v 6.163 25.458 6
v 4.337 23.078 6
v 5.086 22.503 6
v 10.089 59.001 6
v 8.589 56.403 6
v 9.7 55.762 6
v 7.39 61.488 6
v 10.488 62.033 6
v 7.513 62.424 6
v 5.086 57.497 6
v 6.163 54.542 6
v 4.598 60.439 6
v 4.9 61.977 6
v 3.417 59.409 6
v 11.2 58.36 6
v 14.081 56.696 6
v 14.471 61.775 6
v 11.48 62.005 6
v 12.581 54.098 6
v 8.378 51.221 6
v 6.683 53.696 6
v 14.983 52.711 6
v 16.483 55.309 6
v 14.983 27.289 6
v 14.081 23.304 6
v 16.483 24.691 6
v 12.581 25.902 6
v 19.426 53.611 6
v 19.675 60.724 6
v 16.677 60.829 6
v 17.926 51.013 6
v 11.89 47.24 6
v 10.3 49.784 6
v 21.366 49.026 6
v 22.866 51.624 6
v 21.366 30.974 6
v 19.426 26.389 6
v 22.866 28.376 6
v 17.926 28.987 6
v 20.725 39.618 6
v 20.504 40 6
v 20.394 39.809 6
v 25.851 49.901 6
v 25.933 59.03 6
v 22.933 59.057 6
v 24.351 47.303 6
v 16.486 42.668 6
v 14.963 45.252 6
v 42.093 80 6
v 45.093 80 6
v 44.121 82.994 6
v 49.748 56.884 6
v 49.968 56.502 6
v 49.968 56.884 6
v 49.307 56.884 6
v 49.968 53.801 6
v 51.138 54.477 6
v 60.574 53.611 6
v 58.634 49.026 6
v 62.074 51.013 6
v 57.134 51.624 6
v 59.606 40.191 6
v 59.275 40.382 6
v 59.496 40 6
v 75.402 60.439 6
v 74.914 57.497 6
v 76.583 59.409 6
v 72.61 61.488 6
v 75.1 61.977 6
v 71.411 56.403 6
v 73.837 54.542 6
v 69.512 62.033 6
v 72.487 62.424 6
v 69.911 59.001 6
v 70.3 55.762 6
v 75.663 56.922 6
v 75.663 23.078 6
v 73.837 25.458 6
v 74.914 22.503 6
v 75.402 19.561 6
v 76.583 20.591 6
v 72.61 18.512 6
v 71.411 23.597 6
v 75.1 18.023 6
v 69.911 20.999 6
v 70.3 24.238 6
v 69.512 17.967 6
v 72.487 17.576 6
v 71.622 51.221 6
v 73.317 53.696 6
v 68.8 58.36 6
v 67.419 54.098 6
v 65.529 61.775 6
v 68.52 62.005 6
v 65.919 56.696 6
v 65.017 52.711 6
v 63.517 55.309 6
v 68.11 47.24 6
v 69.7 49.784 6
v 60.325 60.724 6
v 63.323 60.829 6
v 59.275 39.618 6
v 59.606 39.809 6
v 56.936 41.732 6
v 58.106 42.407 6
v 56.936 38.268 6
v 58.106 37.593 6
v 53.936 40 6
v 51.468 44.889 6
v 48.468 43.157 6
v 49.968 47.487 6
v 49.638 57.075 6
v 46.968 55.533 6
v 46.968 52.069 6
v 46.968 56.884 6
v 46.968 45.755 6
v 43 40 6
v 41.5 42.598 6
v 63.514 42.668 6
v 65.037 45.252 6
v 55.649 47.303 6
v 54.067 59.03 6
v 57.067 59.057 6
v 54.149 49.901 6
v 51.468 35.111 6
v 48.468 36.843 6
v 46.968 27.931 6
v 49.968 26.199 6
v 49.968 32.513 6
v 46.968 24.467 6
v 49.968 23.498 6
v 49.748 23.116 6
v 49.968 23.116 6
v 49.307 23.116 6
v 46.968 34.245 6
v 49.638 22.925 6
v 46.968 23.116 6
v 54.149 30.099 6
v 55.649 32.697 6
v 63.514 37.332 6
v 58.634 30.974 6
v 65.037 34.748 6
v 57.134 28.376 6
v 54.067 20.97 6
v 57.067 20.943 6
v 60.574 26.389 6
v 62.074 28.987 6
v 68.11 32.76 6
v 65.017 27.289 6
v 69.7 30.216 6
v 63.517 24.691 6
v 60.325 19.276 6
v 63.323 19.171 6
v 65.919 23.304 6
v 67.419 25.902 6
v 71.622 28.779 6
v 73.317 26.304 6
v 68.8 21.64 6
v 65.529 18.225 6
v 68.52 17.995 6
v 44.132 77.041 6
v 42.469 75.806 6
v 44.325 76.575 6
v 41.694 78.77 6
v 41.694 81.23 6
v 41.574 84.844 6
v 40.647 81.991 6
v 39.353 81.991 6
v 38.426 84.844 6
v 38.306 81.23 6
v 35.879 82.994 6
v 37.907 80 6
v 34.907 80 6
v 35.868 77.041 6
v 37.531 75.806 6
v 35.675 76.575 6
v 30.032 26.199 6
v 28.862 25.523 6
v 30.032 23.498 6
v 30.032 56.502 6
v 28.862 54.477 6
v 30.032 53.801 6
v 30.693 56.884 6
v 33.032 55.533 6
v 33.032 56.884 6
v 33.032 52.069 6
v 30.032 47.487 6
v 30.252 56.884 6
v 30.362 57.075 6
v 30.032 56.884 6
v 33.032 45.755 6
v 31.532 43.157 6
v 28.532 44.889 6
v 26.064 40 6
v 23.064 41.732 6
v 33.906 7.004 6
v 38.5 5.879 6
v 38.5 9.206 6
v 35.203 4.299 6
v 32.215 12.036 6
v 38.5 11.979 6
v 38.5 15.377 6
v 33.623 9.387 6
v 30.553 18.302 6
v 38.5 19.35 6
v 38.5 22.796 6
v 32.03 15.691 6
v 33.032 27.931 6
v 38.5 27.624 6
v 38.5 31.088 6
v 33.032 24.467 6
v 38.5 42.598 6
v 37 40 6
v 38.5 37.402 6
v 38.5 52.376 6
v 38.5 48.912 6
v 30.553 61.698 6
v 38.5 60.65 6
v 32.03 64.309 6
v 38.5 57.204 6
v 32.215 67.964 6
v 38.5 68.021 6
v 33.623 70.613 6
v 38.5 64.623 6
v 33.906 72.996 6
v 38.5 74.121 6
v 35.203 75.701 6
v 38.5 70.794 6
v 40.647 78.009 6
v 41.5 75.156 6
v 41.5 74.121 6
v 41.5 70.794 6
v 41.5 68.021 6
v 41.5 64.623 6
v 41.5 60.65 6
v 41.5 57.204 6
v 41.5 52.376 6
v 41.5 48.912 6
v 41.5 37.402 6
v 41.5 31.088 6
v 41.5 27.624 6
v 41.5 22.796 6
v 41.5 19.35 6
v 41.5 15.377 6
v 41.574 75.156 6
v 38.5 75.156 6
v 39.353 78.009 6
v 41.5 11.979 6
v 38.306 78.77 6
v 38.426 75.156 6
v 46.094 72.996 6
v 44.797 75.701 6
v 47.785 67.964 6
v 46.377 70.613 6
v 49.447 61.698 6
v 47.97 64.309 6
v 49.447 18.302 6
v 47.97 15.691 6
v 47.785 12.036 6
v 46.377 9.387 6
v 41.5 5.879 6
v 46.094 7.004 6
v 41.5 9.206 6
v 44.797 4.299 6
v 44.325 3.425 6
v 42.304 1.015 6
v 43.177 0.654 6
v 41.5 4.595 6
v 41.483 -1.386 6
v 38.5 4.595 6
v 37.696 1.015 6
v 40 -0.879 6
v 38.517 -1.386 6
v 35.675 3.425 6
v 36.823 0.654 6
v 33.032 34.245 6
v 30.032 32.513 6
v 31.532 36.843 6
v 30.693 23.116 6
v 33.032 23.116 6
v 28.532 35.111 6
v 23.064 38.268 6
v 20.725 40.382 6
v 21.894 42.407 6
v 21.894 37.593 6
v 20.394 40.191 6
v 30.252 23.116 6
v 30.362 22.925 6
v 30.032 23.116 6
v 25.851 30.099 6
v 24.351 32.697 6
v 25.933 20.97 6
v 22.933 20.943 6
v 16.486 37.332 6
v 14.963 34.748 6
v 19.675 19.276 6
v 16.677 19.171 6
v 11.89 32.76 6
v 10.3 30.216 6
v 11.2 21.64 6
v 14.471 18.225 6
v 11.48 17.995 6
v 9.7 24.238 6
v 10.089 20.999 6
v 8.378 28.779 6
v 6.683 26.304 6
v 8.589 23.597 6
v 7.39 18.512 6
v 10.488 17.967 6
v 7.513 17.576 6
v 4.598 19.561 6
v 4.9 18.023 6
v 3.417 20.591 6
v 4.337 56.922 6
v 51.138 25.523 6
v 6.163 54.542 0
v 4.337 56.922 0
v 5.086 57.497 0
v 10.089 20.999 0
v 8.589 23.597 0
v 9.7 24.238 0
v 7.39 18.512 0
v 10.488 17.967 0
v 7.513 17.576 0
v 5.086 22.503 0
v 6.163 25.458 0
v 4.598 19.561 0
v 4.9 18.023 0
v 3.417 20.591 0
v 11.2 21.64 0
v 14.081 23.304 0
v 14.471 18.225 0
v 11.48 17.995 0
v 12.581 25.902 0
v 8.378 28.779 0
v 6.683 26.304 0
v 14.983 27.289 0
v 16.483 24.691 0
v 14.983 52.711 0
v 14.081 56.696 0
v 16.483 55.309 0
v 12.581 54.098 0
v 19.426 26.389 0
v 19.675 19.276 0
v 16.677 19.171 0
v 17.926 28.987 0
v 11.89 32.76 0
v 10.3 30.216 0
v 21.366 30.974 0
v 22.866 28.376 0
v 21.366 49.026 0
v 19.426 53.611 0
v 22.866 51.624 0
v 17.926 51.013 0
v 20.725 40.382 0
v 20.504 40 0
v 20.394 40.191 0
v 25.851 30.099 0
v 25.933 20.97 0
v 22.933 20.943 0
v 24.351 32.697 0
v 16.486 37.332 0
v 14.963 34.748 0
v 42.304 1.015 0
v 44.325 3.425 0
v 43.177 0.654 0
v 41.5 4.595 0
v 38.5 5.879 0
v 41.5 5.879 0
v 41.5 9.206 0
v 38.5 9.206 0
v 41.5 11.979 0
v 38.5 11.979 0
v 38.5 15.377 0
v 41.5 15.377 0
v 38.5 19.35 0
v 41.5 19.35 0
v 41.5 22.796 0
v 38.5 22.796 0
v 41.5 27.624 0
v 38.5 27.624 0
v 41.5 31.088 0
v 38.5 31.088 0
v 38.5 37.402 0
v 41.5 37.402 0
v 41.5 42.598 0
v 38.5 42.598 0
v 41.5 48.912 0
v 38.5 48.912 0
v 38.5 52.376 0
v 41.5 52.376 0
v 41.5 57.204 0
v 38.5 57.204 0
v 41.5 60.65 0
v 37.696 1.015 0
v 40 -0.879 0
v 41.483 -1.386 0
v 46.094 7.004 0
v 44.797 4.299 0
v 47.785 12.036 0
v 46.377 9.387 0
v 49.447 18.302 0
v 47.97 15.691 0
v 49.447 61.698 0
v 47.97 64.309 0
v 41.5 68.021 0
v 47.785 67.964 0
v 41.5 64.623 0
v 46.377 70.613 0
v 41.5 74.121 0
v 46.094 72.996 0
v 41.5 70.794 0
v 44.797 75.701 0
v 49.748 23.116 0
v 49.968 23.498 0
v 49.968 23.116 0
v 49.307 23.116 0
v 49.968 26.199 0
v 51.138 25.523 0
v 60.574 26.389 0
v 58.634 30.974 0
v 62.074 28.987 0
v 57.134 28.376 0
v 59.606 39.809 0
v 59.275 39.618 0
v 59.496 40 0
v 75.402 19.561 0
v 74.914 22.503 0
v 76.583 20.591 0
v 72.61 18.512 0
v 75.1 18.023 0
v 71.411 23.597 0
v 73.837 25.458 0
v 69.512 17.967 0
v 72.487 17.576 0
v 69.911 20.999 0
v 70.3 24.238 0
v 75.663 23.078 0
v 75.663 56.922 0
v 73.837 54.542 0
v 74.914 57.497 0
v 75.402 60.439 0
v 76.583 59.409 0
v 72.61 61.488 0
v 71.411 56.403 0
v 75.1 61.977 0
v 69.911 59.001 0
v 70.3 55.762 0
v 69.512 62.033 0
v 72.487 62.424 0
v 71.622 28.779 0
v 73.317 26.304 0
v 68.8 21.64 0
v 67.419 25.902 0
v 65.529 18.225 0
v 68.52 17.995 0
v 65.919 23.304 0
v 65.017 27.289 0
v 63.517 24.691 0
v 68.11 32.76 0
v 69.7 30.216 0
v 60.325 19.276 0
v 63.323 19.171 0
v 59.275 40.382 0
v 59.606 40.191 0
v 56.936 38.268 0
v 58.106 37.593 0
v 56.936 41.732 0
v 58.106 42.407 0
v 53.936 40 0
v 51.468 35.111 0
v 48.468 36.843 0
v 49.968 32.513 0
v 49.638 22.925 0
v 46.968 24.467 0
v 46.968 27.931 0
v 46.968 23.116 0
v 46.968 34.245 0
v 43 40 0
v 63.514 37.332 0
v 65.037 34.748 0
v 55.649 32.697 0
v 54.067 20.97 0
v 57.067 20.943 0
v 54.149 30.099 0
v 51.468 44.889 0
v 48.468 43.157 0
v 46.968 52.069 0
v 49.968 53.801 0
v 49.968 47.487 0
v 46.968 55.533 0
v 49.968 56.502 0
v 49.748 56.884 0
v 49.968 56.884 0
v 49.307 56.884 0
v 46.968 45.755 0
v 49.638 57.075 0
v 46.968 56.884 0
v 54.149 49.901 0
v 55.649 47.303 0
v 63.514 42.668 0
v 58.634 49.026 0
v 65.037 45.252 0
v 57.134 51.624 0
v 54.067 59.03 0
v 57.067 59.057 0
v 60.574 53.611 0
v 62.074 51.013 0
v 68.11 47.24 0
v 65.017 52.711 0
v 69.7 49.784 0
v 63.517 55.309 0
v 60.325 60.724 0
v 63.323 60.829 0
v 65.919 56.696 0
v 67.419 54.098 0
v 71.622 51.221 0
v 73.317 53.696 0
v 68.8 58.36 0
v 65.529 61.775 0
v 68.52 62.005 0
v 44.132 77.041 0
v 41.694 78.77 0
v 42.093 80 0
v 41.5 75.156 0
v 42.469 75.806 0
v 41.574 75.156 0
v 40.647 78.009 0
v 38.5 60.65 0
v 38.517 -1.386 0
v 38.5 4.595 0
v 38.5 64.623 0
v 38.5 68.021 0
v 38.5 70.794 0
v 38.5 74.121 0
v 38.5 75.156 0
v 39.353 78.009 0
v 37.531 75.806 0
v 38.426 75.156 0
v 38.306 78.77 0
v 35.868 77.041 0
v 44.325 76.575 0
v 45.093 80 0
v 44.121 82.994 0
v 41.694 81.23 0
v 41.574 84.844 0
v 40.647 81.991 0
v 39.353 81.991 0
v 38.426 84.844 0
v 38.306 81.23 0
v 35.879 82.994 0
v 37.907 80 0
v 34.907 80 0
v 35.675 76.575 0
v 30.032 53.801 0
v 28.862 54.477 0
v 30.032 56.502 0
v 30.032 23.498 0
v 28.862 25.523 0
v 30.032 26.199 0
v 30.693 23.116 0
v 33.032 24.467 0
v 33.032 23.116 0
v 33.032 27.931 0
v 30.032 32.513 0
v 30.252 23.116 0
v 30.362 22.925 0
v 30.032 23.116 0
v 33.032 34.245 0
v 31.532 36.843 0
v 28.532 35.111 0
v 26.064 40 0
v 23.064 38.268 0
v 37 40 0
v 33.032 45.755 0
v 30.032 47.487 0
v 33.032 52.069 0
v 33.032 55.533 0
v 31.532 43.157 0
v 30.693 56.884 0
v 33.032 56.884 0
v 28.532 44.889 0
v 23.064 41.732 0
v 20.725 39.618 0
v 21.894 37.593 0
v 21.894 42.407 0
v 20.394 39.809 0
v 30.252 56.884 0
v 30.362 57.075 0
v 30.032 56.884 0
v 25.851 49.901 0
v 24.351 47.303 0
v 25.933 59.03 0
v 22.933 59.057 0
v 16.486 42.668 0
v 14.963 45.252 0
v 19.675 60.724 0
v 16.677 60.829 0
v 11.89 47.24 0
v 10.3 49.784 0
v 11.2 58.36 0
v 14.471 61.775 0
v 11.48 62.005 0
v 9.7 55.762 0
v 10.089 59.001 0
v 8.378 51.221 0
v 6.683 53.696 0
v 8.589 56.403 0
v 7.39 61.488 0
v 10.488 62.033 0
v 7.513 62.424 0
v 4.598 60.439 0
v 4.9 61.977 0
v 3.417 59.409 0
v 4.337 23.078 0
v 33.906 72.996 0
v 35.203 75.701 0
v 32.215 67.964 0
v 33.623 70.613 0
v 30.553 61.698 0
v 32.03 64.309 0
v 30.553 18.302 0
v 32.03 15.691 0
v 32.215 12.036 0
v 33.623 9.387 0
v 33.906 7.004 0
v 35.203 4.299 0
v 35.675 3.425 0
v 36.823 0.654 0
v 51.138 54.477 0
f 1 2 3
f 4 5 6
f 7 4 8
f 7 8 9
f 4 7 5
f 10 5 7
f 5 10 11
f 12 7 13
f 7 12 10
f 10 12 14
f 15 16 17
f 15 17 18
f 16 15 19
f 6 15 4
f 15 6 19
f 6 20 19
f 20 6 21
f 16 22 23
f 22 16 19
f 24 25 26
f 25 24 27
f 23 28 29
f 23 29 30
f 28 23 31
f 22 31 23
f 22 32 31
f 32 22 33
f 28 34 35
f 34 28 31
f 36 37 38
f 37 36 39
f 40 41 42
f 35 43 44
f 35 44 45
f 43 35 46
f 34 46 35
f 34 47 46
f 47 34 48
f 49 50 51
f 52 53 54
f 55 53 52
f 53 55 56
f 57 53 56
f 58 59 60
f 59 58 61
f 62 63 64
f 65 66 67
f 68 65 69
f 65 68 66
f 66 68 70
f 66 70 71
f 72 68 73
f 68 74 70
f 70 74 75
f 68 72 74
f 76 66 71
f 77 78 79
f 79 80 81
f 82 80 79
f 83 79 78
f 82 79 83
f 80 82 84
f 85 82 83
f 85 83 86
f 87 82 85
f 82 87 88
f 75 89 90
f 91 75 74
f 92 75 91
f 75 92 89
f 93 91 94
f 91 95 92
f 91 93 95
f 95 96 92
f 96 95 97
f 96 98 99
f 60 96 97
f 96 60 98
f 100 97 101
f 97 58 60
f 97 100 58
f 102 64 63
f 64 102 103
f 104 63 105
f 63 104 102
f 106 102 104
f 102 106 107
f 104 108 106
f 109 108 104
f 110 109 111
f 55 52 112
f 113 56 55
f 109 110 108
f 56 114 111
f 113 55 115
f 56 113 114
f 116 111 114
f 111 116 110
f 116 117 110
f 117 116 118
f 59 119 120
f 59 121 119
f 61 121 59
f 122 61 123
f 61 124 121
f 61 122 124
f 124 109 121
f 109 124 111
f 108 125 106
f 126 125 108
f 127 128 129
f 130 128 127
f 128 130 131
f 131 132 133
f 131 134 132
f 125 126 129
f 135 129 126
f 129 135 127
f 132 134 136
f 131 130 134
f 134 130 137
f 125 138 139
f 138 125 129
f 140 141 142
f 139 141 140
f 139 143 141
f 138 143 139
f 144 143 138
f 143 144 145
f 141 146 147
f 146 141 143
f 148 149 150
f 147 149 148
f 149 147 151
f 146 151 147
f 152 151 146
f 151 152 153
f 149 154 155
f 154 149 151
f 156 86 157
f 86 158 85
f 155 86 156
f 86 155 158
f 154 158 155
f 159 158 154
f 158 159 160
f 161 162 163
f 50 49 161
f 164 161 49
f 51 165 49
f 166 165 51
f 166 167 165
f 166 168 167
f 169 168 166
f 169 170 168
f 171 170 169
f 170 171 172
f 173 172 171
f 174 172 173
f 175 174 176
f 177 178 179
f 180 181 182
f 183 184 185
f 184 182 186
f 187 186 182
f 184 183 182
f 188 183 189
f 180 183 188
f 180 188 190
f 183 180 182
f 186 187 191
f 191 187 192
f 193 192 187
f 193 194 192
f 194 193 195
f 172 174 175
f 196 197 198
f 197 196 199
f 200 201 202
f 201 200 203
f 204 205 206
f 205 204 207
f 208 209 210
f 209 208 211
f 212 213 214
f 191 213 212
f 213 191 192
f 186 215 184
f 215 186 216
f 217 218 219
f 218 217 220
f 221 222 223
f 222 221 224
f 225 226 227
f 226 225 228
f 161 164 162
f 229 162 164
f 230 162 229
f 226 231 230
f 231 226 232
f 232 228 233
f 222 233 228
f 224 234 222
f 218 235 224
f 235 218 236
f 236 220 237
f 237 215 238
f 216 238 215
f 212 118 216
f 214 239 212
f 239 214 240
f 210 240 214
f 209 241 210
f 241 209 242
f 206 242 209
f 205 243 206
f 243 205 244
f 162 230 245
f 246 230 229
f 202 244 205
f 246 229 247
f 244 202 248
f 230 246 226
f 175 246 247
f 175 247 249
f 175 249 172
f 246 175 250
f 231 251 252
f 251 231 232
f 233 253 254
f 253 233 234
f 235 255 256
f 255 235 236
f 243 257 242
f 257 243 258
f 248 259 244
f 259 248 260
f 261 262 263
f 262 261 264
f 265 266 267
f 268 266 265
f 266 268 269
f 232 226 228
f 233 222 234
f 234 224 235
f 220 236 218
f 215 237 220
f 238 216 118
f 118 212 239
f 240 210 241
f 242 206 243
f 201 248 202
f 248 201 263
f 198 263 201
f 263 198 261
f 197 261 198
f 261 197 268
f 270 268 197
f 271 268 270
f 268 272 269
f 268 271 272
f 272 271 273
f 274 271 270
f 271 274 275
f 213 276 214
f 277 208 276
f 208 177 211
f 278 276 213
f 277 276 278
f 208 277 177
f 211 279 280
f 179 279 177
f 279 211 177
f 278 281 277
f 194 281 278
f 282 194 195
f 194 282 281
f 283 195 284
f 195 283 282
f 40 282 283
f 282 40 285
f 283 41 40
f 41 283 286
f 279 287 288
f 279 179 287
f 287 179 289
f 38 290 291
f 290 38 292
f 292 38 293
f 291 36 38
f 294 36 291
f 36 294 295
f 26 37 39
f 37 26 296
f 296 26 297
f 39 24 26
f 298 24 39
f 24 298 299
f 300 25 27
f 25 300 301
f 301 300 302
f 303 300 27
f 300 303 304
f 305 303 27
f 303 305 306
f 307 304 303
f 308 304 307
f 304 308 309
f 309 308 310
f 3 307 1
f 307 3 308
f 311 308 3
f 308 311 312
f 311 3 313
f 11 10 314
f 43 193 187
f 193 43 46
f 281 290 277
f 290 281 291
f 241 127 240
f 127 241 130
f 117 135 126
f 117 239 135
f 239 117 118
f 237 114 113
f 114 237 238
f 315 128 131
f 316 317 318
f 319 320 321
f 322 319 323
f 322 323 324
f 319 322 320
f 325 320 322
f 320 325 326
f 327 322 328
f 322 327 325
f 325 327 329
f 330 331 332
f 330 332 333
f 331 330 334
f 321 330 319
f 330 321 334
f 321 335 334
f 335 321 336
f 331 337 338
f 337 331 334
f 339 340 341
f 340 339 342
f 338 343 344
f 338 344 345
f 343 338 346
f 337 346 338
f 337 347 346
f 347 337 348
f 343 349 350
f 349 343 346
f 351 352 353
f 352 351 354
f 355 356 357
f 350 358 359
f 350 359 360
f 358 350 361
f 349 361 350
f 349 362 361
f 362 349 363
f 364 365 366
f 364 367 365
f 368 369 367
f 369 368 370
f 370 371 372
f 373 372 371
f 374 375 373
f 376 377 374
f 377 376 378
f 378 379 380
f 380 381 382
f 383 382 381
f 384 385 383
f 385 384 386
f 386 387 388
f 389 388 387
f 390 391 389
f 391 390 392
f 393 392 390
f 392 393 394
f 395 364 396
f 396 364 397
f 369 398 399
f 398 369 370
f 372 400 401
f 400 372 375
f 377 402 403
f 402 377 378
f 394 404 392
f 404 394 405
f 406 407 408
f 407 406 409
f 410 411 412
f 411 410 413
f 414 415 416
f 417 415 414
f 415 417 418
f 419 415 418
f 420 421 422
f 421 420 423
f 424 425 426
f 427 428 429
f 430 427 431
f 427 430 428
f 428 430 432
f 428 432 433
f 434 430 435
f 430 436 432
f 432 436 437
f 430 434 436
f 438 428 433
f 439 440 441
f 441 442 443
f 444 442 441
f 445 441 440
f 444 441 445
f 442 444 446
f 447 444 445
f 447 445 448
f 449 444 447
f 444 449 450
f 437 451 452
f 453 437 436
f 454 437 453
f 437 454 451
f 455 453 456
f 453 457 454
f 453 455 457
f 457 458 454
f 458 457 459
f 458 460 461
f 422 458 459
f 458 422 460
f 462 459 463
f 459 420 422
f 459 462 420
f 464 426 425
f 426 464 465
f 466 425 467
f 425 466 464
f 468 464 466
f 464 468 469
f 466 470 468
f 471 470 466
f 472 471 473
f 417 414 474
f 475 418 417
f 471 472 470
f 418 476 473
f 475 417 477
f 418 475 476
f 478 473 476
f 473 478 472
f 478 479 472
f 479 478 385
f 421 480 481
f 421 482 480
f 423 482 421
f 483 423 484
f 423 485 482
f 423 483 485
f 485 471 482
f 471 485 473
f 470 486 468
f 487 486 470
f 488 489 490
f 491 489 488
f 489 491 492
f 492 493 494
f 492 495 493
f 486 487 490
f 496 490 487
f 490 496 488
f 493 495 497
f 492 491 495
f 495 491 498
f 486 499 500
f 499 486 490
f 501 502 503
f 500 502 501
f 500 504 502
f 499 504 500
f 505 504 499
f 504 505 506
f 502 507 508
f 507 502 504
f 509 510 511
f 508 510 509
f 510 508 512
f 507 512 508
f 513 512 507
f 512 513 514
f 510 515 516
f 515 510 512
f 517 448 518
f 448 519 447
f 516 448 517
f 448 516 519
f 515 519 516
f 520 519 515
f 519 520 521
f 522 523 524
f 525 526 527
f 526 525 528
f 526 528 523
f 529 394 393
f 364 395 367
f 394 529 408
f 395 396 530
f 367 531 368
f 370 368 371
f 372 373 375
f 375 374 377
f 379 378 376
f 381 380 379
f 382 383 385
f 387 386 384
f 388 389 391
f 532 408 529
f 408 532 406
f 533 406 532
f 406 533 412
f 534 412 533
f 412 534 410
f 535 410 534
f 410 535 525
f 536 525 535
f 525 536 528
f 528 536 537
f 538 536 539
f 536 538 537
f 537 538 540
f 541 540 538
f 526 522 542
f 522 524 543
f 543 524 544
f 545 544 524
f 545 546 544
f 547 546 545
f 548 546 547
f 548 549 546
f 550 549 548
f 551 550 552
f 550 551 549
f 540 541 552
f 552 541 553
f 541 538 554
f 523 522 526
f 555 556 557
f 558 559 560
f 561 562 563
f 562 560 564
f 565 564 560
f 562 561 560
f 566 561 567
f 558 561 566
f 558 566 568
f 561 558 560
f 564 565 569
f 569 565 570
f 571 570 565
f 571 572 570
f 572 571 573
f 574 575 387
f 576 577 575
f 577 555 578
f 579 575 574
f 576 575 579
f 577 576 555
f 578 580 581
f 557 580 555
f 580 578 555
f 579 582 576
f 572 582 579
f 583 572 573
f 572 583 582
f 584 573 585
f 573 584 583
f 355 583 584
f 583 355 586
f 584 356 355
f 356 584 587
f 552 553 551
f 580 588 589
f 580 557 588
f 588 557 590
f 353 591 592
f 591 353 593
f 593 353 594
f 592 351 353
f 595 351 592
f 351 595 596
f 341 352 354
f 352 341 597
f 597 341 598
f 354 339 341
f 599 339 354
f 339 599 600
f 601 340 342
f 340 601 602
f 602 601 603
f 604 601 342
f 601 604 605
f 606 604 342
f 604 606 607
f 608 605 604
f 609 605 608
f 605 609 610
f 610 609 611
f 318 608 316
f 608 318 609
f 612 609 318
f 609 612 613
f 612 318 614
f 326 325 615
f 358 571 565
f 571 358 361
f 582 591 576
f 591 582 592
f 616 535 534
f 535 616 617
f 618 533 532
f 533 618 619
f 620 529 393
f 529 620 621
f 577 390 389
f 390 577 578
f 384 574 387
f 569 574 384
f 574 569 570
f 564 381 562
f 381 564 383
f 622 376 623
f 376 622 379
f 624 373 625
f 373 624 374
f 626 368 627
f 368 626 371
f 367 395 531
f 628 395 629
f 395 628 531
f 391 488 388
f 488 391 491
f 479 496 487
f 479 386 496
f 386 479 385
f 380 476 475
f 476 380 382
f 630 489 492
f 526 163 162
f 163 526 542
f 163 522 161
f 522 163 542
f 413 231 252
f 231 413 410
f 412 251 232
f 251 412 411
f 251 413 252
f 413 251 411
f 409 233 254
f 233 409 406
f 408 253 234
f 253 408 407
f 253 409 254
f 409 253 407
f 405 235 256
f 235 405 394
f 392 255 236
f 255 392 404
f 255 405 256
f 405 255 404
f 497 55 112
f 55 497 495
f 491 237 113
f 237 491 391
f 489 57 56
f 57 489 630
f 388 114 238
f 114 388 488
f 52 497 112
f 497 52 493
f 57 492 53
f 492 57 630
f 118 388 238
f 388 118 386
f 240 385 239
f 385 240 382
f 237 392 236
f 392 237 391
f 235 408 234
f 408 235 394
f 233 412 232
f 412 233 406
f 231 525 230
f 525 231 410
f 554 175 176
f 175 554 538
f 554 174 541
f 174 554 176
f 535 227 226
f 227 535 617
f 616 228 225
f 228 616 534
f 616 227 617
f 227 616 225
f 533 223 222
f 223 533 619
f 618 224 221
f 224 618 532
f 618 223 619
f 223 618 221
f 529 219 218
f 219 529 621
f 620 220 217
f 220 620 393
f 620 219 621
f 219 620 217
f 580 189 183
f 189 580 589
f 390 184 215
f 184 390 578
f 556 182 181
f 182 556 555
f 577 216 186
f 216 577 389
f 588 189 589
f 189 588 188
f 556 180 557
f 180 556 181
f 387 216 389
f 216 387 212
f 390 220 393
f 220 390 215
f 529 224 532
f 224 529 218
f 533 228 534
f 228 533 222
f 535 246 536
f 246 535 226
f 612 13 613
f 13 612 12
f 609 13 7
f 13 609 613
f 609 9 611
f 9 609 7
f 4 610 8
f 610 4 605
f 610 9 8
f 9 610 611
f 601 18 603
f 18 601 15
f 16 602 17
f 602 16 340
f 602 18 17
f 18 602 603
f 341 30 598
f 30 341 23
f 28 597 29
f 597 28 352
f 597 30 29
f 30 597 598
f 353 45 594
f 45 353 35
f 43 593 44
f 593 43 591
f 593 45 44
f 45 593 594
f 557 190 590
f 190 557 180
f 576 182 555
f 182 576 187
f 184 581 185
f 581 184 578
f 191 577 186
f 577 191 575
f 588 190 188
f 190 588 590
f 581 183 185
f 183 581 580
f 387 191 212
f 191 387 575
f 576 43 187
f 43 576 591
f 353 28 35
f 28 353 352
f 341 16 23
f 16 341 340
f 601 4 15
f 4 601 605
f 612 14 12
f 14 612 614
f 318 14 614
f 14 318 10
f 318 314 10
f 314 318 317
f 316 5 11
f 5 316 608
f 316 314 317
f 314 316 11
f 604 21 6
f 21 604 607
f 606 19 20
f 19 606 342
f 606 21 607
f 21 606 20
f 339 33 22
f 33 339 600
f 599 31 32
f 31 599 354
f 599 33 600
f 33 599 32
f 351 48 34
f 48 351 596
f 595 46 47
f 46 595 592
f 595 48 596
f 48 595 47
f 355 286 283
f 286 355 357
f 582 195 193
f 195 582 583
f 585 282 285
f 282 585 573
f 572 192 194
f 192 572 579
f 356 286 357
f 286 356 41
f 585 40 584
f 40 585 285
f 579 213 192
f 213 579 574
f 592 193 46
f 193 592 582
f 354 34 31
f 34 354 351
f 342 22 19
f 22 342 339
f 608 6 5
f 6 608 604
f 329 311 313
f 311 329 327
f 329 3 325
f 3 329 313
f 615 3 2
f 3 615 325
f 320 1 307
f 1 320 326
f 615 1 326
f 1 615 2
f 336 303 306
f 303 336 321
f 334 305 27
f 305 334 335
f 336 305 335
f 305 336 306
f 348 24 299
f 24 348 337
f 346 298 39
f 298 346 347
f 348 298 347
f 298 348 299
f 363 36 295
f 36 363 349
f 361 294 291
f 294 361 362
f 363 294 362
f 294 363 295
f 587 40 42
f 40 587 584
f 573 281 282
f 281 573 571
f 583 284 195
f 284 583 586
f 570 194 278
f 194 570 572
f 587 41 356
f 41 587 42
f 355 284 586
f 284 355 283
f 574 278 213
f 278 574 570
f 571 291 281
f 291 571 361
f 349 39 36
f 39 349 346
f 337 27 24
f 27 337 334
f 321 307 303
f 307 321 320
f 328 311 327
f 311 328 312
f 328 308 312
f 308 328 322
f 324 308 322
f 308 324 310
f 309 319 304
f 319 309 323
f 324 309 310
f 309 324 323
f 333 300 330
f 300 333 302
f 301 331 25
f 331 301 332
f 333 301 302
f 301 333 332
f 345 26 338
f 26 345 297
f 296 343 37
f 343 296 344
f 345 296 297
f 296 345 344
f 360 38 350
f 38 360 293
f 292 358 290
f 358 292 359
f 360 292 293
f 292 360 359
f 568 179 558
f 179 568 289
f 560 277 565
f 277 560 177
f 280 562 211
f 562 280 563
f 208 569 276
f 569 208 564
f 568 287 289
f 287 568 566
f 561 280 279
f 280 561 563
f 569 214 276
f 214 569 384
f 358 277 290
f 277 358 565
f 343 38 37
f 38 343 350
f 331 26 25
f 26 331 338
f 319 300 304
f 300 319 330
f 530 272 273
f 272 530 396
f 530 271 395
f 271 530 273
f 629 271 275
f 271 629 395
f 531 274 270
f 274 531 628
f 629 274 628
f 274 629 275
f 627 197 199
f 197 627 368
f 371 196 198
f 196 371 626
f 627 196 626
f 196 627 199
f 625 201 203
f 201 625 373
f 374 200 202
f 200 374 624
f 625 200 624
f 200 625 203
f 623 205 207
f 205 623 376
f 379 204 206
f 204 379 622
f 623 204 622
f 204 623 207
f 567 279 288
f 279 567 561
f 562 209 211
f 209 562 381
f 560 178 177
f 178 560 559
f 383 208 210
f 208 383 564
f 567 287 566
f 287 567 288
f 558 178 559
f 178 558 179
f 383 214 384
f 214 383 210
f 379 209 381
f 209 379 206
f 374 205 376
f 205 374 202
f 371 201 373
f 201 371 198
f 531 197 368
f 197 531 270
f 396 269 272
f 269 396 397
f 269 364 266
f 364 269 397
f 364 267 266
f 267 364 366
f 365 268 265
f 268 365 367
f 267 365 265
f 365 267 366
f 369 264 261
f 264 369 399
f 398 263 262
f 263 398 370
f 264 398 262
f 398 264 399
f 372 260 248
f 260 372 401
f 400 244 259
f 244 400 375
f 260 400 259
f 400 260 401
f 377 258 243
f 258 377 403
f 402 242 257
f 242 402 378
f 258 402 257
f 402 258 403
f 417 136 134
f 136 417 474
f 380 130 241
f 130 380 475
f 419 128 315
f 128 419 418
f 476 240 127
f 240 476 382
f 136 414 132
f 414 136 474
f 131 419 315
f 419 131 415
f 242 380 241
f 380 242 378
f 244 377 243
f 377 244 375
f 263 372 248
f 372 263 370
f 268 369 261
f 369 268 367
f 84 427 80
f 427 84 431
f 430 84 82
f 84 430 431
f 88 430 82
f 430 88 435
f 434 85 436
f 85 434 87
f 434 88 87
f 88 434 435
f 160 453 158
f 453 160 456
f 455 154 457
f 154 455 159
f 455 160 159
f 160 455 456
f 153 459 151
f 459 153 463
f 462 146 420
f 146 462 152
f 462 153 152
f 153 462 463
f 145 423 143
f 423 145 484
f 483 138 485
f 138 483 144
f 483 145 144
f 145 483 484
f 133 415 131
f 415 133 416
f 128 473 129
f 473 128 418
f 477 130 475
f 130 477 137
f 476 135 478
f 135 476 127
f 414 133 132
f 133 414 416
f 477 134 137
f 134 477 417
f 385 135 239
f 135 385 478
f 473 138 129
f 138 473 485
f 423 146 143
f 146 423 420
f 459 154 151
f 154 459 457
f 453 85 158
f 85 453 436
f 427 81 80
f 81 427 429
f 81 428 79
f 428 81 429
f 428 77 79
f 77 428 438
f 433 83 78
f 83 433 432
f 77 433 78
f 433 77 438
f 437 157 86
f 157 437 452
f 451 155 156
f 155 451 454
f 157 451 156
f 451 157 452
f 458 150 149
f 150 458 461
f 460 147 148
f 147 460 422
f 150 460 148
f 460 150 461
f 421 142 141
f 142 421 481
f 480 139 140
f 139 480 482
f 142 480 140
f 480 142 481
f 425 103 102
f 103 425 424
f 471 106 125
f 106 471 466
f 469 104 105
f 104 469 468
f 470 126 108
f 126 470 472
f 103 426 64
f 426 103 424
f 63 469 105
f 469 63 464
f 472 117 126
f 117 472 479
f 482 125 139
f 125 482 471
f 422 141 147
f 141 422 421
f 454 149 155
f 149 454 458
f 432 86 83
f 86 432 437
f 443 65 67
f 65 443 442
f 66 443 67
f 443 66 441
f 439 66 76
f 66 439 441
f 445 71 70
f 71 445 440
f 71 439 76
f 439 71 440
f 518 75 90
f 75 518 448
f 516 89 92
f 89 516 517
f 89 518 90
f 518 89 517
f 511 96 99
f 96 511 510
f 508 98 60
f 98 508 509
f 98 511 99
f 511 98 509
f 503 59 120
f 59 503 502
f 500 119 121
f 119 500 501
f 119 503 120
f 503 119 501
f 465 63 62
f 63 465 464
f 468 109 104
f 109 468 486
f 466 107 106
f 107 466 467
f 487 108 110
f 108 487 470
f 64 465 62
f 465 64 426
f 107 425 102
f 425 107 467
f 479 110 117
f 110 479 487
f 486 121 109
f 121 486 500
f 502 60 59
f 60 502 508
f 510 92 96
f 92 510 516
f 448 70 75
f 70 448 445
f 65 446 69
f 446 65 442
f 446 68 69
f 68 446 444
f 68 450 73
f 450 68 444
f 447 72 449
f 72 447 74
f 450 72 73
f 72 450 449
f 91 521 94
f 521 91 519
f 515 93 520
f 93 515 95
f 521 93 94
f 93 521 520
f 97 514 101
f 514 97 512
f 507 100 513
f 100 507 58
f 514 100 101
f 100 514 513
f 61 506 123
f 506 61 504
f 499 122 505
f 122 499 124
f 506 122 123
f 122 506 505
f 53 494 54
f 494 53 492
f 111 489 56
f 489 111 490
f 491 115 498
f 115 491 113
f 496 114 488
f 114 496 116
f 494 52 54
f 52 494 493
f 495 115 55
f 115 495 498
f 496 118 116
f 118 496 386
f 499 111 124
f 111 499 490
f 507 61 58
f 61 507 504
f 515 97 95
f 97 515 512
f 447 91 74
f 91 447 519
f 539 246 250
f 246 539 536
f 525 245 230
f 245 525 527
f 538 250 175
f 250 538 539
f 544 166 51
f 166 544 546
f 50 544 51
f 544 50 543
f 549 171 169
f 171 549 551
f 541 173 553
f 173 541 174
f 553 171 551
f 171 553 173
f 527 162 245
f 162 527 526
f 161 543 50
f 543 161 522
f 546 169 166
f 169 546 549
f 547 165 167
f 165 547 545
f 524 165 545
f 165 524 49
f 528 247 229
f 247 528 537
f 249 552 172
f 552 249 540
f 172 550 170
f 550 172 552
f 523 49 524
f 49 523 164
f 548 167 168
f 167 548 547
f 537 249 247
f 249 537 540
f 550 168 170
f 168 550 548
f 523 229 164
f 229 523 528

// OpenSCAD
// [FL_INDEX: keywords="openscad, 3d_parametric, Parametric_Snowflake_Ornament, csg_solid" | COT="Parametric OpenSCAD design from 3DCodeverse"]
// Title: Parametric Snowflake Ornament

//Parametric Snowflake... and star
//common snowflake variables
//make seed 100 for a star
arm_num = 6;
branch_length =40;
branch_angle = 15;
branch_thickness = 3;
thickness = 6;
spike_num = 6; //suggest under 40
seed =1; //any number 1 -7

//snowflake starts
module tree(branch_length,branch_angle, branch_thickness, thickness,spike_num,seed){
	module half_tree(){
		cube([branch_thickness/2,branch_length,thickness]);

		for ( i = [1:spike_num]){
			translate([0, (branch_length-1.3)*cos(i*13), 0]) 
			rotate(branch_angle*(seed+sin(i*15))) 
			cube([branch_length*sin(i*(2+seed))+0.5, branch_thickness, thickness]);
		}
	}

	half_tree(branch_length, branch_angle,branch_thickness, thickness,spike_num, seed);
	mirror()half_tree(branch_length, branch_angle, thickness, spike_num, seed);
}

module snowflake(arm_num, branch_length, branch_angle, branch_thickness, thickness, spike_num, seed){
	hole_dist = branch_length;
	translate([0,branch_length,0])cylinder(h=thickness, r=branch_length*sin(1*(2+seed))+branch_thickness, $fn=10);
		for ( i = [0:arm_num-1]){
			rotate( i*360/arm_num, [0,0,1])
			tree(branch_length,branch_angle, branch_thickness, thickness,spike_num,seed);
		}
}

translate([branch_length,branch_length,0]){
difference(){

snowflake(
	arm_num, 
	branch_length, 
	branch_angle,
	branch_thickness,
	thickness,
	spike_num,
	seed
);
translate([0,branch_length,-2])cylinder(h=thickness*2, r=branch_length*sin(3), $fn=10);
}
}
